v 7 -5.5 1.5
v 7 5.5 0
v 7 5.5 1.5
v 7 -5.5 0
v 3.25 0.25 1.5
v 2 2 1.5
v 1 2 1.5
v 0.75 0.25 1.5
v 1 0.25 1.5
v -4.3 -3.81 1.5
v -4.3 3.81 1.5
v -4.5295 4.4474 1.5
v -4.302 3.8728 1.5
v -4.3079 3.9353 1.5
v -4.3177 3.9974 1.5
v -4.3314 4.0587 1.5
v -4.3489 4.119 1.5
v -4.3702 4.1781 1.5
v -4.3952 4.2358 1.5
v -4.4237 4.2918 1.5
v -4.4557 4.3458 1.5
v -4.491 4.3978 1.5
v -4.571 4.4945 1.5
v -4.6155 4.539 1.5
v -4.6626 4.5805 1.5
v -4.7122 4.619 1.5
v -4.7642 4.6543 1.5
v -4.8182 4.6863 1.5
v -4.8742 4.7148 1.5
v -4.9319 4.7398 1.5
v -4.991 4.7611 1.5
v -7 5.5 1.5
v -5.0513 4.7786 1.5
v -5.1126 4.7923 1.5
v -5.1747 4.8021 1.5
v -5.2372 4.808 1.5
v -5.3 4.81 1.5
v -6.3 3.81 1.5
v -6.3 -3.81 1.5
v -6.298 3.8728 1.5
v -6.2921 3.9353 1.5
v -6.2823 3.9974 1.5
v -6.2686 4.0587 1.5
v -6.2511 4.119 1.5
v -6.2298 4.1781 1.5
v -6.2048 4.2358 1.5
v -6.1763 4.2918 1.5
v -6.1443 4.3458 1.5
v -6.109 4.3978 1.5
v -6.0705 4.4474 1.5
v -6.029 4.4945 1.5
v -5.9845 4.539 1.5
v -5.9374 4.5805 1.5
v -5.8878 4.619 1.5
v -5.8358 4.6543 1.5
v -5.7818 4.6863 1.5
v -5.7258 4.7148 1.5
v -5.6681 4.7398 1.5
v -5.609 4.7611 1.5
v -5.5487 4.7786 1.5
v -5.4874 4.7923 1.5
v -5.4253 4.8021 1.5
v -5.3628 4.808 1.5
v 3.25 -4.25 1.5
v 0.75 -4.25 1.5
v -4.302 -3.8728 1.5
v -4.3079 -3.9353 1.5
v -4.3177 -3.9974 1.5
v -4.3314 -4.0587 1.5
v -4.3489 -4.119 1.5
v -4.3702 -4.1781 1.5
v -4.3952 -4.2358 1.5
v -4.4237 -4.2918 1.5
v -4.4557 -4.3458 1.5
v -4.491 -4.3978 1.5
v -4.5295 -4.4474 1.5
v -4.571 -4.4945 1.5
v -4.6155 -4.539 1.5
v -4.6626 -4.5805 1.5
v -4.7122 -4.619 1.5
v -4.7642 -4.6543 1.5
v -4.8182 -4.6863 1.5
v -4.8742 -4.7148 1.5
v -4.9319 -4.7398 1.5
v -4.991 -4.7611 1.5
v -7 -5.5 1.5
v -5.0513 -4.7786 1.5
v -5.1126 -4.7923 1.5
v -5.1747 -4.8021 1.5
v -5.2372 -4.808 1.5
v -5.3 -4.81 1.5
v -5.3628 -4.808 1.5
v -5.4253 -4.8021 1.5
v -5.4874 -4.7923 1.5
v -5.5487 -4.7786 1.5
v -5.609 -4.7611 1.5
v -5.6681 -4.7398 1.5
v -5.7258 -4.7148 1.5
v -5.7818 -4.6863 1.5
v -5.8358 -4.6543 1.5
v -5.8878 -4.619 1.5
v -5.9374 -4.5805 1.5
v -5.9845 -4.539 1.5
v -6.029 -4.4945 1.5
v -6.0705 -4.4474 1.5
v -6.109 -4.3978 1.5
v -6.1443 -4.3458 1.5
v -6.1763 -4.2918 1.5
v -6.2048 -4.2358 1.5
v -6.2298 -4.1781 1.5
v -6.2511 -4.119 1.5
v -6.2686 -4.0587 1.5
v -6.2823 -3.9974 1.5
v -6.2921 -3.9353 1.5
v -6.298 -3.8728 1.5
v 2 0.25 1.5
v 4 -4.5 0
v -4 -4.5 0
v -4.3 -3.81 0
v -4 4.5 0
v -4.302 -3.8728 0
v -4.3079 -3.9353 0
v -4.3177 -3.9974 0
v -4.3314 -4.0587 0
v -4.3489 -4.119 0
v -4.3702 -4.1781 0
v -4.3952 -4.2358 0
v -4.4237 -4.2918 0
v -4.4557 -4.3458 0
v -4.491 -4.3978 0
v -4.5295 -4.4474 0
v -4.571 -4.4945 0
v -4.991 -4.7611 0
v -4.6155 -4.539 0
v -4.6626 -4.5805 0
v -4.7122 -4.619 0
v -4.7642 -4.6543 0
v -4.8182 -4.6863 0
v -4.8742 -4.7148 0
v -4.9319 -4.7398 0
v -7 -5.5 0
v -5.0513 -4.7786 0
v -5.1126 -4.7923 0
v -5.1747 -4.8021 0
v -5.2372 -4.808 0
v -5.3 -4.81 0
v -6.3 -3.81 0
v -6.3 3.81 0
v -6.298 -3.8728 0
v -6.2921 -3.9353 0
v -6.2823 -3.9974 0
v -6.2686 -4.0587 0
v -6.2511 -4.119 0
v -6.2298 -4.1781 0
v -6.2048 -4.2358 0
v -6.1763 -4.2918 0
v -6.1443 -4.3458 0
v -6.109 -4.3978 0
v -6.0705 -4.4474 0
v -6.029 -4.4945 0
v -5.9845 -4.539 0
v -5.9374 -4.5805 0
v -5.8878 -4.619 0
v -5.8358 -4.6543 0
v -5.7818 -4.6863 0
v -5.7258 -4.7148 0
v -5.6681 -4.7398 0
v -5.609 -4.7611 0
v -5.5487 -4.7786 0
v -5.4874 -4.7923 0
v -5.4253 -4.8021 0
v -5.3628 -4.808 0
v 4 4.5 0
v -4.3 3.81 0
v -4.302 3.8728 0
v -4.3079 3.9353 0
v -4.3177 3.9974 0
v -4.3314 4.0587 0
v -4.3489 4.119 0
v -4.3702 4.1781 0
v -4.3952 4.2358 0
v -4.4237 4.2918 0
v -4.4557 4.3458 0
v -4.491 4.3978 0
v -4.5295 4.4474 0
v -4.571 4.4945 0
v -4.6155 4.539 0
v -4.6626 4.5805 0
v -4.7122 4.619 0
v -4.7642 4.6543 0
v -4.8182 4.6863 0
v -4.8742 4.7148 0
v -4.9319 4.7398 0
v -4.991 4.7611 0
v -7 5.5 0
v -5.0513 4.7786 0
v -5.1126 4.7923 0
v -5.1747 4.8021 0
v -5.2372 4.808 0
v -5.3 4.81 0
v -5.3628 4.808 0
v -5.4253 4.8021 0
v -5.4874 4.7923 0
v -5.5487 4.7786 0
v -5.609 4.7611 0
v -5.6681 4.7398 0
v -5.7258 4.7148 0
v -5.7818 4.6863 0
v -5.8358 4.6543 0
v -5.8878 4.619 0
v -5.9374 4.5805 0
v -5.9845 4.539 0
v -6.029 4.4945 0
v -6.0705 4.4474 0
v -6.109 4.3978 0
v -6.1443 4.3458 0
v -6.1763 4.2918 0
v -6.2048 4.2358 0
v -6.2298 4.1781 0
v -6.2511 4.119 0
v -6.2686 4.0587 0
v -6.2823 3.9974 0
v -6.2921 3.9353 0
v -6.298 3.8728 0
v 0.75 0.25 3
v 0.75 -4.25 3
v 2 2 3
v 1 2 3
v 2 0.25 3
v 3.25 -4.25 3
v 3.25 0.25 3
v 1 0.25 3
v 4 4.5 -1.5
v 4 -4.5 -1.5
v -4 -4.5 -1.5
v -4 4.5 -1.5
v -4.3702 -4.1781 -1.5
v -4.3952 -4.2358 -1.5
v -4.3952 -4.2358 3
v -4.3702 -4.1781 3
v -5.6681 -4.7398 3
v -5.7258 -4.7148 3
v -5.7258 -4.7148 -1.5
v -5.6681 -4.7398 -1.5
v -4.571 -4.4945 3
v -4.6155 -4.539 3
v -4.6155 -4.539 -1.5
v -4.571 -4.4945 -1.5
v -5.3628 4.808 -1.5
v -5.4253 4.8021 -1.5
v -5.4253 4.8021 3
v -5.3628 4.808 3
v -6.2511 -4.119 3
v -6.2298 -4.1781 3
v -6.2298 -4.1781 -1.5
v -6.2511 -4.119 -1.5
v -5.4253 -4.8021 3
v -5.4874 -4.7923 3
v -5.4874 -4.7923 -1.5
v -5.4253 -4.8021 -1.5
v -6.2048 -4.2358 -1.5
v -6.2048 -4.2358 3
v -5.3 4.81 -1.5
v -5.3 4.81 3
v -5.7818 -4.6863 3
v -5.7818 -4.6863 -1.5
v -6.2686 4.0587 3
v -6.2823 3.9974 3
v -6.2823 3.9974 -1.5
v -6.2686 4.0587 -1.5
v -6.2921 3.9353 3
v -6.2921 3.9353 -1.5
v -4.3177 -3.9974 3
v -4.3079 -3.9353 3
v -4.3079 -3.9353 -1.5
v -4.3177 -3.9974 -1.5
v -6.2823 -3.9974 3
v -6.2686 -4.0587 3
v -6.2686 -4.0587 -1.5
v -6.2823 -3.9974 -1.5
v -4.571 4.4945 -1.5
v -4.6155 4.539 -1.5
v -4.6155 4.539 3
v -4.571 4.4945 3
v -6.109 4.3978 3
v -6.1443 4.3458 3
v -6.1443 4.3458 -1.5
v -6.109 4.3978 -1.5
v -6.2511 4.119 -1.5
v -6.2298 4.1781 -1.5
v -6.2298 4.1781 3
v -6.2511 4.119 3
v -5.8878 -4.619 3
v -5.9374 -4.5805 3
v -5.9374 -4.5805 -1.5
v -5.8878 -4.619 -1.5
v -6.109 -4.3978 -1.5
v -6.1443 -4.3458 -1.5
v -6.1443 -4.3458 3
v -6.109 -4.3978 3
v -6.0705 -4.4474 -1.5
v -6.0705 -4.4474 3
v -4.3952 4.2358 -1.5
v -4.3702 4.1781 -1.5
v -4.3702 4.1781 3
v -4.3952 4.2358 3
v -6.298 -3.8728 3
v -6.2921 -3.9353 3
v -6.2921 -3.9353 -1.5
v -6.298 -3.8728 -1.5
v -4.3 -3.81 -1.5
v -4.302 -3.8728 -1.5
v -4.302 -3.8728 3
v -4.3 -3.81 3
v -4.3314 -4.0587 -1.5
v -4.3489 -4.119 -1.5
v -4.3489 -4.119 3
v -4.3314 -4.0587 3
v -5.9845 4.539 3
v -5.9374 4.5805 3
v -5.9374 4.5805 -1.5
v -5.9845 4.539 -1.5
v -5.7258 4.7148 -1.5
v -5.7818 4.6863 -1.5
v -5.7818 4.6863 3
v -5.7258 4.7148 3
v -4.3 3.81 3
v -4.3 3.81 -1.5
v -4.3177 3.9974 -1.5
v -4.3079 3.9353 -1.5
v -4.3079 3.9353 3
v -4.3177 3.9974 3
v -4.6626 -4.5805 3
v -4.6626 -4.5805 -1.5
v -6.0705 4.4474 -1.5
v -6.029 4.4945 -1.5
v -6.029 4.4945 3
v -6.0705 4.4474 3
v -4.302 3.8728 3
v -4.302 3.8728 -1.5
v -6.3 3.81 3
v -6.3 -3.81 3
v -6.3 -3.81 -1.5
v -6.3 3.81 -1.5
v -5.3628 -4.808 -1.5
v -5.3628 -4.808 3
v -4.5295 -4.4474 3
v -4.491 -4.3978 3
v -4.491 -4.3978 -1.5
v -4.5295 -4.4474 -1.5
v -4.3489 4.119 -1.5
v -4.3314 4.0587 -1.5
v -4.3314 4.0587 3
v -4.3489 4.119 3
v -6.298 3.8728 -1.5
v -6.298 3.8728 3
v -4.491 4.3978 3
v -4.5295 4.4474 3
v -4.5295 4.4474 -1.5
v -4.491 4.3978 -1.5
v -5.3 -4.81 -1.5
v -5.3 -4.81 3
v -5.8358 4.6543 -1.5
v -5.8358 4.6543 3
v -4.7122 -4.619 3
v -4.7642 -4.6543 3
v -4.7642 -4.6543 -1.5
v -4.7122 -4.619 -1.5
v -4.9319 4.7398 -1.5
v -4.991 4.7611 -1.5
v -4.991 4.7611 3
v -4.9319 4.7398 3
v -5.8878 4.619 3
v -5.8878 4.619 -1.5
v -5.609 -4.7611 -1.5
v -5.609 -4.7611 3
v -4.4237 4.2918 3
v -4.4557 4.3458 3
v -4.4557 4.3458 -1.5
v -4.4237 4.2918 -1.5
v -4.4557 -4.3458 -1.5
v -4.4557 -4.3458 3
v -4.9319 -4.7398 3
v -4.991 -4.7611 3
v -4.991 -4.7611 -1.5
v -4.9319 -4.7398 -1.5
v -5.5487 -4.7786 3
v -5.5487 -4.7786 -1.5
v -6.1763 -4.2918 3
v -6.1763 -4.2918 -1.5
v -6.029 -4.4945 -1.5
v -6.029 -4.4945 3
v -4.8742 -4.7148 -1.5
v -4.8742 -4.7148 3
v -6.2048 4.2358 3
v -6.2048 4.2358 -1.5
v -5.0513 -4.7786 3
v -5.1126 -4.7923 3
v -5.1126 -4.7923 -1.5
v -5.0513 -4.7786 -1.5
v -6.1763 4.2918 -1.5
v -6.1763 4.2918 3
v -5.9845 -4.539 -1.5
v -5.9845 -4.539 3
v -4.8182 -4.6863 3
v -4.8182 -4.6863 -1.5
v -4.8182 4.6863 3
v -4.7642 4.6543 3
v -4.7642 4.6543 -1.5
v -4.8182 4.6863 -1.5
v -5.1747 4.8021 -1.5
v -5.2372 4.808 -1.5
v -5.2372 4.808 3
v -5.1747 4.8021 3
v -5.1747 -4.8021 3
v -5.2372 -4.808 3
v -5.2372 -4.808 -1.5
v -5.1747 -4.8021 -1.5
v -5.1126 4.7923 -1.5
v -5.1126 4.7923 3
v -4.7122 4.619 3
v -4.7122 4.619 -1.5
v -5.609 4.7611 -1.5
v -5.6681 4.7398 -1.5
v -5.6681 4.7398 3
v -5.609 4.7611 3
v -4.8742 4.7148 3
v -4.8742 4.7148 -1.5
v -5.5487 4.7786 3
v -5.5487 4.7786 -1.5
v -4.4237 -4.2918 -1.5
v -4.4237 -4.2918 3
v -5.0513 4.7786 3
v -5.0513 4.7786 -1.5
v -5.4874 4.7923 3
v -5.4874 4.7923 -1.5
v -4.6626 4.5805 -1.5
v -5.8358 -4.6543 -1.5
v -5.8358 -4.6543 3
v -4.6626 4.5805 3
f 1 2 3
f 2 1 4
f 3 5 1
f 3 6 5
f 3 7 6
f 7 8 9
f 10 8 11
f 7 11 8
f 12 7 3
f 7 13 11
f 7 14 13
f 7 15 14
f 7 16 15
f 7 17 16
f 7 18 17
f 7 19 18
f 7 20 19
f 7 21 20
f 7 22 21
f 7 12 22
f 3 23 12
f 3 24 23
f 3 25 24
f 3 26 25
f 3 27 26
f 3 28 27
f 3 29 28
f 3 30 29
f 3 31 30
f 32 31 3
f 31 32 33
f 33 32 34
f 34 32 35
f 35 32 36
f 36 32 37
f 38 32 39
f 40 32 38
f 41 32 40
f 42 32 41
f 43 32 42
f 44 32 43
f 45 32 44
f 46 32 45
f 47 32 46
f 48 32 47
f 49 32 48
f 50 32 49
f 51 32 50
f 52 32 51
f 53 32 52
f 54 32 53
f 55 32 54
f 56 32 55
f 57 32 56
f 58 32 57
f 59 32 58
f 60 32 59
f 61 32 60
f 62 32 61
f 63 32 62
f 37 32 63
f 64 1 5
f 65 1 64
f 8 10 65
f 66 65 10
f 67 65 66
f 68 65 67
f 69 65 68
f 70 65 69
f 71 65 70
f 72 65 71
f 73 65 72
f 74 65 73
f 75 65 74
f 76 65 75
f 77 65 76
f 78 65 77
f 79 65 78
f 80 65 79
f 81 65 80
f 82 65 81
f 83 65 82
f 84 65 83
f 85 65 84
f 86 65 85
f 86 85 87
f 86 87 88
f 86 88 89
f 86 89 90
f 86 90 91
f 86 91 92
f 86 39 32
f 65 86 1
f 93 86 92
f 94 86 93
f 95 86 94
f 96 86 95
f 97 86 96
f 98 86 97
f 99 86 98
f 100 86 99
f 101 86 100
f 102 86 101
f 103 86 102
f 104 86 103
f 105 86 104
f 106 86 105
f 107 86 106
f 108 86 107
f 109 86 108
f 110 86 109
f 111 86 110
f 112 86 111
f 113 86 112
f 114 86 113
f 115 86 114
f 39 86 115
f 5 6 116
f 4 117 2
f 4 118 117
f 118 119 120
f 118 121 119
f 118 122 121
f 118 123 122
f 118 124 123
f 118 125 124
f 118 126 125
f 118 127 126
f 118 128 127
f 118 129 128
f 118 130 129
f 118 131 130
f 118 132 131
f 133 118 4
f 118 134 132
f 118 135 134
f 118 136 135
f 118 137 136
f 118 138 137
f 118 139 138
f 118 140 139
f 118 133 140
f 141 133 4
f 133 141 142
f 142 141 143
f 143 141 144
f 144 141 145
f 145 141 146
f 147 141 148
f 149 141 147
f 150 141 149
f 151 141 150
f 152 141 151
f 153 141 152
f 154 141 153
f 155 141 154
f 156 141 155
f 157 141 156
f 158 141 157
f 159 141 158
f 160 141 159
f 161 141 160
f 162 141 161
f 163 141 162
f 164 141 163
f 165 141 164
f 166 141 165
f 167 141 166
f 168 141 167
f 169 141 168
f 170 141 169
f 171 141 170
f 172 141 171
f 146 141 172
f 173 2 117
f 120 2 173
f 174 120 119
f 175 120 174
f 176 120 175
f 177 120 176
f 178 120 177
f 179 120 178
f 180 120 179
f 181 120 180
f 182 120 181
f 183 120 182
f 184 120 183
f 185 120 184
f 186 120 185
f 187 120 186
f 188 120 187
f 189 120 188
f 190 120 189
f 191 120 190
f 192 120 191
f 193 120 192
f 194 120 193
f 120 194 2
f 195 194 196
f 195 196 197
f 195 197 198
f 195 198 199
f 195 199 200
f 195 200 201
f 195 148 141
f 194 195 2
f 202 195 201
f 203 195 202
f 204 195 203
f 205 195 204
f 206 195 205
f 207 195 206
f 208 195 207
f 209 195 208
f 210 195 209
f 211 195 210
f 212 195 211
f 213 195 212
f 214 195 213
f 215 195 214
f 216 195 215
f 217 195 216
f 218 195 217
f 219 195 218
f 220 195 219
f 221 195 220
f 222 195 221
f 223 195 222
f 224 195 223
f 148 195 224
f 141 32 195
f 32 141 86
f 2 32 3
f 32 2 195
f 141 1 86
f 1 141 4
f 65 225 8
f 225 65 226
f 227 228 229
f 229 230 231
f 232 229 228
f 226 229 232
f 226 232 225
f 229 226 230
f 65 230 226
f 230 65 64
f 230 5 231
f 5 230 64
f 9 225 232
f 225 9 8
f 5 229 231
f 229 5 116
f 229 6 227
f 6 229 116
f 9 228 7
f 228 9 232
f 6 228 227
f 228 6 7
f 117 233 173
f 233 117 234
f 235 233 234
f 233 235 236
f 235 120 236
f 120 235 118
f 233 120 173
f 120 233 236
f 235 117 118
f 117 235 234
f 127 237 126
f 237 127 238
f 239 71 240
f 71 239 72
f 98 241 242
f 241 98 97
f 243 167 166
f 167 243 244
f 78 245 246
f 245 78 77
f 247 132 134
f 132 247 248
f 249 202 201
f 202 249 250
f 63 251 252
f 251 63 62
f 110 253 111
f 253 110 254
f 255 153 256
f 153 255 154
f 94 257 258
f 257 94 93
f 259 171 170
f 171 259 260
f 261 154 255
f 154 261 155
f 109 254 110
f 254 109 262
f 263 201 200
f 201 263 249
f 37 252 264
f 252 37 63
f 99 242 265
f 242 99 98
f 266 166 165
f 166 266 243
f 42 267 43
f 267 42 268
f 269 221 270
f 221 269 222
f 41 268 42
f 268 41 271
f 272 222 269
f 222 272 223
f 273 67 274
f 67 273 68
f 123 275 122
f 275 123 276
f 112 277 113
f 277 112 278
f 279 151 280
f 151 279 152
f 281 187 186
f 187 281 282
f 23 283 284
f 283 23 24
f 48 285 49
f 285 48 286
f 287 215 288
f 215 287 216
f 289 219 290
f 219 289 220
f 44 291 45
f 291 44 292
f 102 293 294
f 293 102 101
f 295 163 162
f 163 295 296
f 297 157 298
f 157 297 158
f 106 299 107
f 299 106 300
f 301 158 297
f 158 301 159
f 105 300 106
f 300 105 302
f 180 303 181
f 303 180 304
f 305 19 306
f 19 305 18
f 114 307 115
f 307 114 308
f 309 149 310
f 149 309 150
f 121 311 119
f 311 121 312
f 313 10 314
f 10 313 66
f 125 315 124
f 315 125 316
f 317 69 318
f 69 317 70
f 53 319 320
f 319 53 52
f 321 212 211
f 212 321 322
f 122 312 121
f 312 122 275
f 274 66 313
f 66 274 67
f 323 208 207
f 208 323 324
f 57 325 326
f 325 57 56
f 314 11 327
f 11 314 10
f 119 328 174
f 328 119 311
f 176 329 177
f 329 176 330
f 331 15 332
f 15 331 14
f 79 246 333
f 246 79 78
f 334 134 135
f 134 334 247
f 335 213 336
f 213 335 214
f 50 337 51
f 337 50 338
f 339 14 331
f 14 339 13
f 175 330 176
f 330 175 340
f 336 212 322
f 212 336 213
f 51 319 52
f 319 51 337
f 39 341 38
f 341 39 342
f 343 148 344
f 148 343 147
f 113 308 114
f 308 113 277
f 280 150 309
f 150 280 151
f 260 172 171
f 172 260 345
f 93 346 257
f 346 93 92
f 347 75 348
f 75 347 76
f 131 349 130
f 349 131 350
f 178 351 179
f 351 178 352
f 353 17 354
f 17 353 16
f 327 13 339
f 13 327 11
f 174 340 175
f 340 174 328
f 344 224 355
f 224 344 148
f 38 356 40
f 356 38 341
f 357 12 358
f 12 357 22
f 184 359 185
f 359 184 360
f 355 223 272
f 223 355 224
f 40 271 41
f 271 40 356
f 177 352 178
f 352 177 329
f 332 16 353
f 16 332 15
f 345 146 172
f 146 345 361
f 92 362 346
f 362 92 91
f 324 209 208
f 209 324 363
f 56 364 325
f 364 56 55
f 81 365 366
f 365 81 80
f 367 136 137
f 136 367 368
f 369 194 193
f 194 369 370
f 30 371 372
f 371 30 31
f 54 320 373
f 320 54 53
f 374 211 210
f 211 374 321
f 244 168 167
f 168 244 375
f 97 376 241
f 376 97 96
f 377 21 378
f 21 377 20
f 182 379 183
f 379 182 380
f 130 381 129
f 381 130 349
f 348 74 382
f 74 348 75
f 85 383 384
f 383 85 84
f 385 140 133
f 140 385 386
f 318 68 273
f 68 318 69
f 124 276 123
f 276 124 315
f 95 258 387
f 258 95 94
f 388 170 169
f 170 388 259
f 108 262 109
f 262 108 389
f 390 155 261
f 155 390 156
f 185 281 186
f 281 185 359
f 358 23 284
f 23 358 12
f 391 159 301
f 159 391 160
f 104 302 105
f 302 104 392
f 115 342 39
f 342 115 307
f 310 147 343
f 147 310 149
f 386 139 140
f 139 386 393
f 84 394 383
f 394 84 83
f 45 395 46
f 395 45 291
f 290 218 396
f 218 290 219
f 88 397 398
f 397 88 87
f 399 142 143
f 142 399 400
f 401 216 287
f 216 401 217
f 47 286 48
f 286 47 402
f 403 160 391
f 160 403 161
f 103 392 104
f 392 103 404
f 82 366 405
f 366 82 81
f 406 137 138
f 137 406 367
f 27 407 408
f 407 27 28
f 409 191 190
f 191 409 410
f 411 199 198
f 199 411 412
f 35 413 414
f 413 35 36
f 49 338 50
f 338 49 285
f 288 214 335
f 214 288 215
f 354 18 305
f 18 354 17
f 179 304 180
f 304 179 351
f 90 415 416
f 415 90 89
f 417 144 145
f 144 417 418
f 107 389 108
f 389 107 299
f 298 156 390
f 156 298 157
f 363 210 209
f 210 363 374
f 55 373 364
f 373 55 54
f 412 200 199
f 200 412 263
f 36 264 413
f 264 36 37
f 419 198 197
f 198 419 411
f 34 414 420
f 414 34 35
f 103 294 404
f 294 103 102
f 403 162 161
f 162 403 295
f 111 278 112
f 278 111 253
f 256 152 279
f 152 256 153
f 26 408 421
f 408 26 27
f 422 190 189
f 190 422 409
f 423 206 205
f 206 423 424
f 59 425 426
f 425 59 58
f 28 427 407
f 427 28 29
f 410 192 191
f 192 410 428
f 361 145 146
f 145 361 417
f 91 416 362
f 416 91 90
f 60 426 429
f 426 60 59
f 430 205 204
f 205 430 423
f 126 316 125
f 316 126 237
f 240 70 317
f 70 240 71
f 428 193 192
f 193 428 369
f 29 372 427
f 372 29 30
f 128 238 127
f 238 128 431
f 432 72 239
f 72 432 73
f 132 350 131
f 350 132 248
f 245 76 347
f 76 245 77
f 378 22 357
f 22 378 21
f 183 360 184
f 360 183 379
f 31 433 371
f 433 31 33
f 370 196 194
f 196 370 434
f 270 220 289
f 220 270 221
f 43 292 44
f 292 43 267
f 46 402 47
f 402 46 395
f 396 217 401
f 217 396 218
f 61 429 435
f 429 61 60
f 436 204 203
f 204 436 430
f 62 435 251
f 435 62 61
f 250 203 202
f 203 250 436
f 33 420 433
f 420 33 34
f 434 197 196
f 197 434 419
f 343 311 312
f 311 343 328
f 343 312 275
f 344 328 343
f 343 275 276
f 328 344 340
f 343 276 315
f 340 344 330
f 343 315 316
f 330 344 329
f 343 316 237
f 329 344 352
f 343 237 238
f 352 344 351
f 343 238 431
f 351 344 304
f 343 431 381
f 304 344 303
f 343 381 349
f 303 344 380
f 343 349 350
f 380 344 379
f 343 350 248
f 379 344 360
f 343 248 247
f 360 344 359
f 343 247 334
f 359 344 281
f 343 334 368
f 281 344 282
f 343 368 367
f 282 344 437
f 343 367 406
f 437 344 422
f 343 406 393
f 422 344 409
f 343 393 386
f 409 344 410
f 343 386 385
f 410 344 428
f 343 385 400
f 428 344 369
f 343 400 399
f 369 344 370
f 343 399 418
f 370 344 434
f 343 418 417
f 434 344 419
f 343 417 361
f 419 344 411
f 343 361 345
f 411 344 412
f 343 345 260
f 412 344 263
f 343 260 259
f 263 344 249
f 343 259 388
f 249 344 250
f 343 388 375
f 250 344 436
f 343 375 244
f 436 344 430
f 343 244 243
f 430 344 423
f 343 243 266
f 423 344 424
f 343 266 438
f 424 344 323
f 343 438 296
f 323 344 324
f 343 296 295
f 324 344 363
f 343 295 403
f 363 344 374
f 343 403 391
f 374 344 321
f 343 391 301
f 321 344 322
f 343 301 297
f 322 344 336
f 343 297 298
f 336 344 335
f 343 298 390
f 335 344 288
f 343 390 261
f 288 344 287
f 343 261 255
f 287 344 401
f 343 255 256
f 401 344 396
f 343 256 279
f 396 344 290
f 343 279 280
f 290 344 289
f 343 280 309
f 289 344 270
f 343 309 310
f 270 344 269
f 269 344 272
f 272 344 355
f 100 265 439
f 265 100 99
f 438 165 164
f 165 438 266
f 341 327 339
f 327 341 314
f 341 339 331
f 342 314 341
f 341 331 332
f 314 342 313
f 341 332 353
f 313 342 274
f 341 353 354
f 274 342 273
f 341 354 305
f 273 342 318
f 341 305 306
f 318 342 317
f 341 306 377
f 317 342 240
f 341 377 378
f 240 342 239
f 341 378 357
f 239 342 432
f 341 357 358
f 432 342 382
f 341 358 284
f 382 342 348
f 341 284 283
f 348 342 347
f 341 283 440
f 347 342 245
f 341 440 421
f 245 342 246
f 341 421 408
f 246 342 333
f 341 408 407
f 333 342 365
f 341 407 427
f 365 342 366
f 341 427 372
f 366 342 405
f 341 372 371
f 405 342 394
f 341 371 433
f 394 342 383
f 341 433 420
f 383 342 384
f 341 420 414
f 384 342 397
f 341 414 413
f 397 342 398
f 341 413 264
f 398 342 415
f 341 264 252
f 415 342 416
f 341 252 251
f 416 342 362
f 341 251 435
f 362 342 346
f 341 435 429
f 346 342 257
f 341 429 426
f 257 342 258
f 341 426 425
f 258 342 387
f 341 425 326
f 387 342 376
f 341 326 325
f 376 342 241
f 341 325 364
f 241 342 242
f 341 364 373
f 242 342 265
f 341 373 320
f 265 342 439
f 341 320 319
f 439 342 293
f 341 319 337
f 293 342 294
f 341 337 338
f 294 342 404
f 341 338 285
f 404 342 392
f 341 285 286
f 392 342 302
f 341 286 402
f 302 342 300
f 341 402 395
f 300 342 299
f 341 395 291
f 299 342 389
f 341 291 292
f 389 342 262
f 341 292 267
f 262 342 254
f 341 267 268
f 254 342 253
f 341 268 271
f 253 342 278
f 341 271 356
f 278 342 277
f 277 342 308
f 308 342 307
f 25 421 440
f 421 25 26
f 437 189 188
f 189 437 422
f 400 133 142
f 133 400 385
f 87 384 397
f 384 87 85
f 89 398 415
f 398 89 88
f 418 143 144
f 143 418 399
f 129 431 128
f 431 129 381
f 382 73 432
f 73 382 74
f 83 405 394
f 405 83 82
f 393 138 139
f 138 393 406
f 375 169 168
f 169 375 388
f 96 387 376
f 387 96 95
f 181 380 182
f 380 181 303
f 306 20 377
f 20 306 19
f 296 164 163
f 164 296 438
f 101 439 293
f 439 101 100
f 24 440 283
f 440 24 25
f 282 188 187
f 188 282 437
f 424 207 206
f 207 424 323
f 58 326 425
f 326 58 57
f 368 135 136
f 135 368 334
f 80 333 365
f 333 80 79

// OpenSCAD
// VL53L0X template


module vl53l0x(front=true,back=true)
{
    a=30; // spec says 25 degrees
    e=100;
    pw=14; // Size of PCB
    ph=11;
    pt=1.5;
    // PCB
    t=(back?e:pt);
    translate([-pw/2,-ph/2,pt-t])
    cube([pw,ph,t]);
    // sensor
    sw=2.5; // Size of sensor
    sh=4.5;
    st=1.5;
    sx=9;
    sy=3.5;
    w2=sw+e*sin(a);
    h2=sh+e*sin(a);
    hull()
    {
        translate([sx-pw/2-sw/2,sy-ph/2-sh/2,0])
        cube([sw,sh,pt+t]);
        if(front)
            translate([sx-pw/2-w2/2,sy-ph/2-h2/2,st+e])
            cube([w2,h2,t]);
    }
    // cap
    cw=1;
    ch=2;
    cx=8.5;
    cy=6.5;
    ct=1.5;
    translate([cx-pw/2-cw/2,cy-ph/2-ch/2,0])
    cube([cw,ch,pt+ct]);
    // back
    bw=8;
    bh=9;
    bt=1.5;
    bx=7;
    by=5.5;
    translate([bx-pw/2-bw/2,by-ph/2-bh/2,-bt])
    cube([bw,bh,bt]);
    wx=1.7;
    wy=(ph-3*2.54)/2;
    wt=3+pt;
    wd=2;
    hull($fn=100)
    {
        translate([wx-pw/2,ph/2-wy,pt/2-wt/2])
        cylinder(d=wd,h=wt);
        translate([wx-pw/2,wy-ph/2,pt/2-wt/2])
        cylinder(d=wd,h=wt);
    }
}

vl53l0x(false,false);
